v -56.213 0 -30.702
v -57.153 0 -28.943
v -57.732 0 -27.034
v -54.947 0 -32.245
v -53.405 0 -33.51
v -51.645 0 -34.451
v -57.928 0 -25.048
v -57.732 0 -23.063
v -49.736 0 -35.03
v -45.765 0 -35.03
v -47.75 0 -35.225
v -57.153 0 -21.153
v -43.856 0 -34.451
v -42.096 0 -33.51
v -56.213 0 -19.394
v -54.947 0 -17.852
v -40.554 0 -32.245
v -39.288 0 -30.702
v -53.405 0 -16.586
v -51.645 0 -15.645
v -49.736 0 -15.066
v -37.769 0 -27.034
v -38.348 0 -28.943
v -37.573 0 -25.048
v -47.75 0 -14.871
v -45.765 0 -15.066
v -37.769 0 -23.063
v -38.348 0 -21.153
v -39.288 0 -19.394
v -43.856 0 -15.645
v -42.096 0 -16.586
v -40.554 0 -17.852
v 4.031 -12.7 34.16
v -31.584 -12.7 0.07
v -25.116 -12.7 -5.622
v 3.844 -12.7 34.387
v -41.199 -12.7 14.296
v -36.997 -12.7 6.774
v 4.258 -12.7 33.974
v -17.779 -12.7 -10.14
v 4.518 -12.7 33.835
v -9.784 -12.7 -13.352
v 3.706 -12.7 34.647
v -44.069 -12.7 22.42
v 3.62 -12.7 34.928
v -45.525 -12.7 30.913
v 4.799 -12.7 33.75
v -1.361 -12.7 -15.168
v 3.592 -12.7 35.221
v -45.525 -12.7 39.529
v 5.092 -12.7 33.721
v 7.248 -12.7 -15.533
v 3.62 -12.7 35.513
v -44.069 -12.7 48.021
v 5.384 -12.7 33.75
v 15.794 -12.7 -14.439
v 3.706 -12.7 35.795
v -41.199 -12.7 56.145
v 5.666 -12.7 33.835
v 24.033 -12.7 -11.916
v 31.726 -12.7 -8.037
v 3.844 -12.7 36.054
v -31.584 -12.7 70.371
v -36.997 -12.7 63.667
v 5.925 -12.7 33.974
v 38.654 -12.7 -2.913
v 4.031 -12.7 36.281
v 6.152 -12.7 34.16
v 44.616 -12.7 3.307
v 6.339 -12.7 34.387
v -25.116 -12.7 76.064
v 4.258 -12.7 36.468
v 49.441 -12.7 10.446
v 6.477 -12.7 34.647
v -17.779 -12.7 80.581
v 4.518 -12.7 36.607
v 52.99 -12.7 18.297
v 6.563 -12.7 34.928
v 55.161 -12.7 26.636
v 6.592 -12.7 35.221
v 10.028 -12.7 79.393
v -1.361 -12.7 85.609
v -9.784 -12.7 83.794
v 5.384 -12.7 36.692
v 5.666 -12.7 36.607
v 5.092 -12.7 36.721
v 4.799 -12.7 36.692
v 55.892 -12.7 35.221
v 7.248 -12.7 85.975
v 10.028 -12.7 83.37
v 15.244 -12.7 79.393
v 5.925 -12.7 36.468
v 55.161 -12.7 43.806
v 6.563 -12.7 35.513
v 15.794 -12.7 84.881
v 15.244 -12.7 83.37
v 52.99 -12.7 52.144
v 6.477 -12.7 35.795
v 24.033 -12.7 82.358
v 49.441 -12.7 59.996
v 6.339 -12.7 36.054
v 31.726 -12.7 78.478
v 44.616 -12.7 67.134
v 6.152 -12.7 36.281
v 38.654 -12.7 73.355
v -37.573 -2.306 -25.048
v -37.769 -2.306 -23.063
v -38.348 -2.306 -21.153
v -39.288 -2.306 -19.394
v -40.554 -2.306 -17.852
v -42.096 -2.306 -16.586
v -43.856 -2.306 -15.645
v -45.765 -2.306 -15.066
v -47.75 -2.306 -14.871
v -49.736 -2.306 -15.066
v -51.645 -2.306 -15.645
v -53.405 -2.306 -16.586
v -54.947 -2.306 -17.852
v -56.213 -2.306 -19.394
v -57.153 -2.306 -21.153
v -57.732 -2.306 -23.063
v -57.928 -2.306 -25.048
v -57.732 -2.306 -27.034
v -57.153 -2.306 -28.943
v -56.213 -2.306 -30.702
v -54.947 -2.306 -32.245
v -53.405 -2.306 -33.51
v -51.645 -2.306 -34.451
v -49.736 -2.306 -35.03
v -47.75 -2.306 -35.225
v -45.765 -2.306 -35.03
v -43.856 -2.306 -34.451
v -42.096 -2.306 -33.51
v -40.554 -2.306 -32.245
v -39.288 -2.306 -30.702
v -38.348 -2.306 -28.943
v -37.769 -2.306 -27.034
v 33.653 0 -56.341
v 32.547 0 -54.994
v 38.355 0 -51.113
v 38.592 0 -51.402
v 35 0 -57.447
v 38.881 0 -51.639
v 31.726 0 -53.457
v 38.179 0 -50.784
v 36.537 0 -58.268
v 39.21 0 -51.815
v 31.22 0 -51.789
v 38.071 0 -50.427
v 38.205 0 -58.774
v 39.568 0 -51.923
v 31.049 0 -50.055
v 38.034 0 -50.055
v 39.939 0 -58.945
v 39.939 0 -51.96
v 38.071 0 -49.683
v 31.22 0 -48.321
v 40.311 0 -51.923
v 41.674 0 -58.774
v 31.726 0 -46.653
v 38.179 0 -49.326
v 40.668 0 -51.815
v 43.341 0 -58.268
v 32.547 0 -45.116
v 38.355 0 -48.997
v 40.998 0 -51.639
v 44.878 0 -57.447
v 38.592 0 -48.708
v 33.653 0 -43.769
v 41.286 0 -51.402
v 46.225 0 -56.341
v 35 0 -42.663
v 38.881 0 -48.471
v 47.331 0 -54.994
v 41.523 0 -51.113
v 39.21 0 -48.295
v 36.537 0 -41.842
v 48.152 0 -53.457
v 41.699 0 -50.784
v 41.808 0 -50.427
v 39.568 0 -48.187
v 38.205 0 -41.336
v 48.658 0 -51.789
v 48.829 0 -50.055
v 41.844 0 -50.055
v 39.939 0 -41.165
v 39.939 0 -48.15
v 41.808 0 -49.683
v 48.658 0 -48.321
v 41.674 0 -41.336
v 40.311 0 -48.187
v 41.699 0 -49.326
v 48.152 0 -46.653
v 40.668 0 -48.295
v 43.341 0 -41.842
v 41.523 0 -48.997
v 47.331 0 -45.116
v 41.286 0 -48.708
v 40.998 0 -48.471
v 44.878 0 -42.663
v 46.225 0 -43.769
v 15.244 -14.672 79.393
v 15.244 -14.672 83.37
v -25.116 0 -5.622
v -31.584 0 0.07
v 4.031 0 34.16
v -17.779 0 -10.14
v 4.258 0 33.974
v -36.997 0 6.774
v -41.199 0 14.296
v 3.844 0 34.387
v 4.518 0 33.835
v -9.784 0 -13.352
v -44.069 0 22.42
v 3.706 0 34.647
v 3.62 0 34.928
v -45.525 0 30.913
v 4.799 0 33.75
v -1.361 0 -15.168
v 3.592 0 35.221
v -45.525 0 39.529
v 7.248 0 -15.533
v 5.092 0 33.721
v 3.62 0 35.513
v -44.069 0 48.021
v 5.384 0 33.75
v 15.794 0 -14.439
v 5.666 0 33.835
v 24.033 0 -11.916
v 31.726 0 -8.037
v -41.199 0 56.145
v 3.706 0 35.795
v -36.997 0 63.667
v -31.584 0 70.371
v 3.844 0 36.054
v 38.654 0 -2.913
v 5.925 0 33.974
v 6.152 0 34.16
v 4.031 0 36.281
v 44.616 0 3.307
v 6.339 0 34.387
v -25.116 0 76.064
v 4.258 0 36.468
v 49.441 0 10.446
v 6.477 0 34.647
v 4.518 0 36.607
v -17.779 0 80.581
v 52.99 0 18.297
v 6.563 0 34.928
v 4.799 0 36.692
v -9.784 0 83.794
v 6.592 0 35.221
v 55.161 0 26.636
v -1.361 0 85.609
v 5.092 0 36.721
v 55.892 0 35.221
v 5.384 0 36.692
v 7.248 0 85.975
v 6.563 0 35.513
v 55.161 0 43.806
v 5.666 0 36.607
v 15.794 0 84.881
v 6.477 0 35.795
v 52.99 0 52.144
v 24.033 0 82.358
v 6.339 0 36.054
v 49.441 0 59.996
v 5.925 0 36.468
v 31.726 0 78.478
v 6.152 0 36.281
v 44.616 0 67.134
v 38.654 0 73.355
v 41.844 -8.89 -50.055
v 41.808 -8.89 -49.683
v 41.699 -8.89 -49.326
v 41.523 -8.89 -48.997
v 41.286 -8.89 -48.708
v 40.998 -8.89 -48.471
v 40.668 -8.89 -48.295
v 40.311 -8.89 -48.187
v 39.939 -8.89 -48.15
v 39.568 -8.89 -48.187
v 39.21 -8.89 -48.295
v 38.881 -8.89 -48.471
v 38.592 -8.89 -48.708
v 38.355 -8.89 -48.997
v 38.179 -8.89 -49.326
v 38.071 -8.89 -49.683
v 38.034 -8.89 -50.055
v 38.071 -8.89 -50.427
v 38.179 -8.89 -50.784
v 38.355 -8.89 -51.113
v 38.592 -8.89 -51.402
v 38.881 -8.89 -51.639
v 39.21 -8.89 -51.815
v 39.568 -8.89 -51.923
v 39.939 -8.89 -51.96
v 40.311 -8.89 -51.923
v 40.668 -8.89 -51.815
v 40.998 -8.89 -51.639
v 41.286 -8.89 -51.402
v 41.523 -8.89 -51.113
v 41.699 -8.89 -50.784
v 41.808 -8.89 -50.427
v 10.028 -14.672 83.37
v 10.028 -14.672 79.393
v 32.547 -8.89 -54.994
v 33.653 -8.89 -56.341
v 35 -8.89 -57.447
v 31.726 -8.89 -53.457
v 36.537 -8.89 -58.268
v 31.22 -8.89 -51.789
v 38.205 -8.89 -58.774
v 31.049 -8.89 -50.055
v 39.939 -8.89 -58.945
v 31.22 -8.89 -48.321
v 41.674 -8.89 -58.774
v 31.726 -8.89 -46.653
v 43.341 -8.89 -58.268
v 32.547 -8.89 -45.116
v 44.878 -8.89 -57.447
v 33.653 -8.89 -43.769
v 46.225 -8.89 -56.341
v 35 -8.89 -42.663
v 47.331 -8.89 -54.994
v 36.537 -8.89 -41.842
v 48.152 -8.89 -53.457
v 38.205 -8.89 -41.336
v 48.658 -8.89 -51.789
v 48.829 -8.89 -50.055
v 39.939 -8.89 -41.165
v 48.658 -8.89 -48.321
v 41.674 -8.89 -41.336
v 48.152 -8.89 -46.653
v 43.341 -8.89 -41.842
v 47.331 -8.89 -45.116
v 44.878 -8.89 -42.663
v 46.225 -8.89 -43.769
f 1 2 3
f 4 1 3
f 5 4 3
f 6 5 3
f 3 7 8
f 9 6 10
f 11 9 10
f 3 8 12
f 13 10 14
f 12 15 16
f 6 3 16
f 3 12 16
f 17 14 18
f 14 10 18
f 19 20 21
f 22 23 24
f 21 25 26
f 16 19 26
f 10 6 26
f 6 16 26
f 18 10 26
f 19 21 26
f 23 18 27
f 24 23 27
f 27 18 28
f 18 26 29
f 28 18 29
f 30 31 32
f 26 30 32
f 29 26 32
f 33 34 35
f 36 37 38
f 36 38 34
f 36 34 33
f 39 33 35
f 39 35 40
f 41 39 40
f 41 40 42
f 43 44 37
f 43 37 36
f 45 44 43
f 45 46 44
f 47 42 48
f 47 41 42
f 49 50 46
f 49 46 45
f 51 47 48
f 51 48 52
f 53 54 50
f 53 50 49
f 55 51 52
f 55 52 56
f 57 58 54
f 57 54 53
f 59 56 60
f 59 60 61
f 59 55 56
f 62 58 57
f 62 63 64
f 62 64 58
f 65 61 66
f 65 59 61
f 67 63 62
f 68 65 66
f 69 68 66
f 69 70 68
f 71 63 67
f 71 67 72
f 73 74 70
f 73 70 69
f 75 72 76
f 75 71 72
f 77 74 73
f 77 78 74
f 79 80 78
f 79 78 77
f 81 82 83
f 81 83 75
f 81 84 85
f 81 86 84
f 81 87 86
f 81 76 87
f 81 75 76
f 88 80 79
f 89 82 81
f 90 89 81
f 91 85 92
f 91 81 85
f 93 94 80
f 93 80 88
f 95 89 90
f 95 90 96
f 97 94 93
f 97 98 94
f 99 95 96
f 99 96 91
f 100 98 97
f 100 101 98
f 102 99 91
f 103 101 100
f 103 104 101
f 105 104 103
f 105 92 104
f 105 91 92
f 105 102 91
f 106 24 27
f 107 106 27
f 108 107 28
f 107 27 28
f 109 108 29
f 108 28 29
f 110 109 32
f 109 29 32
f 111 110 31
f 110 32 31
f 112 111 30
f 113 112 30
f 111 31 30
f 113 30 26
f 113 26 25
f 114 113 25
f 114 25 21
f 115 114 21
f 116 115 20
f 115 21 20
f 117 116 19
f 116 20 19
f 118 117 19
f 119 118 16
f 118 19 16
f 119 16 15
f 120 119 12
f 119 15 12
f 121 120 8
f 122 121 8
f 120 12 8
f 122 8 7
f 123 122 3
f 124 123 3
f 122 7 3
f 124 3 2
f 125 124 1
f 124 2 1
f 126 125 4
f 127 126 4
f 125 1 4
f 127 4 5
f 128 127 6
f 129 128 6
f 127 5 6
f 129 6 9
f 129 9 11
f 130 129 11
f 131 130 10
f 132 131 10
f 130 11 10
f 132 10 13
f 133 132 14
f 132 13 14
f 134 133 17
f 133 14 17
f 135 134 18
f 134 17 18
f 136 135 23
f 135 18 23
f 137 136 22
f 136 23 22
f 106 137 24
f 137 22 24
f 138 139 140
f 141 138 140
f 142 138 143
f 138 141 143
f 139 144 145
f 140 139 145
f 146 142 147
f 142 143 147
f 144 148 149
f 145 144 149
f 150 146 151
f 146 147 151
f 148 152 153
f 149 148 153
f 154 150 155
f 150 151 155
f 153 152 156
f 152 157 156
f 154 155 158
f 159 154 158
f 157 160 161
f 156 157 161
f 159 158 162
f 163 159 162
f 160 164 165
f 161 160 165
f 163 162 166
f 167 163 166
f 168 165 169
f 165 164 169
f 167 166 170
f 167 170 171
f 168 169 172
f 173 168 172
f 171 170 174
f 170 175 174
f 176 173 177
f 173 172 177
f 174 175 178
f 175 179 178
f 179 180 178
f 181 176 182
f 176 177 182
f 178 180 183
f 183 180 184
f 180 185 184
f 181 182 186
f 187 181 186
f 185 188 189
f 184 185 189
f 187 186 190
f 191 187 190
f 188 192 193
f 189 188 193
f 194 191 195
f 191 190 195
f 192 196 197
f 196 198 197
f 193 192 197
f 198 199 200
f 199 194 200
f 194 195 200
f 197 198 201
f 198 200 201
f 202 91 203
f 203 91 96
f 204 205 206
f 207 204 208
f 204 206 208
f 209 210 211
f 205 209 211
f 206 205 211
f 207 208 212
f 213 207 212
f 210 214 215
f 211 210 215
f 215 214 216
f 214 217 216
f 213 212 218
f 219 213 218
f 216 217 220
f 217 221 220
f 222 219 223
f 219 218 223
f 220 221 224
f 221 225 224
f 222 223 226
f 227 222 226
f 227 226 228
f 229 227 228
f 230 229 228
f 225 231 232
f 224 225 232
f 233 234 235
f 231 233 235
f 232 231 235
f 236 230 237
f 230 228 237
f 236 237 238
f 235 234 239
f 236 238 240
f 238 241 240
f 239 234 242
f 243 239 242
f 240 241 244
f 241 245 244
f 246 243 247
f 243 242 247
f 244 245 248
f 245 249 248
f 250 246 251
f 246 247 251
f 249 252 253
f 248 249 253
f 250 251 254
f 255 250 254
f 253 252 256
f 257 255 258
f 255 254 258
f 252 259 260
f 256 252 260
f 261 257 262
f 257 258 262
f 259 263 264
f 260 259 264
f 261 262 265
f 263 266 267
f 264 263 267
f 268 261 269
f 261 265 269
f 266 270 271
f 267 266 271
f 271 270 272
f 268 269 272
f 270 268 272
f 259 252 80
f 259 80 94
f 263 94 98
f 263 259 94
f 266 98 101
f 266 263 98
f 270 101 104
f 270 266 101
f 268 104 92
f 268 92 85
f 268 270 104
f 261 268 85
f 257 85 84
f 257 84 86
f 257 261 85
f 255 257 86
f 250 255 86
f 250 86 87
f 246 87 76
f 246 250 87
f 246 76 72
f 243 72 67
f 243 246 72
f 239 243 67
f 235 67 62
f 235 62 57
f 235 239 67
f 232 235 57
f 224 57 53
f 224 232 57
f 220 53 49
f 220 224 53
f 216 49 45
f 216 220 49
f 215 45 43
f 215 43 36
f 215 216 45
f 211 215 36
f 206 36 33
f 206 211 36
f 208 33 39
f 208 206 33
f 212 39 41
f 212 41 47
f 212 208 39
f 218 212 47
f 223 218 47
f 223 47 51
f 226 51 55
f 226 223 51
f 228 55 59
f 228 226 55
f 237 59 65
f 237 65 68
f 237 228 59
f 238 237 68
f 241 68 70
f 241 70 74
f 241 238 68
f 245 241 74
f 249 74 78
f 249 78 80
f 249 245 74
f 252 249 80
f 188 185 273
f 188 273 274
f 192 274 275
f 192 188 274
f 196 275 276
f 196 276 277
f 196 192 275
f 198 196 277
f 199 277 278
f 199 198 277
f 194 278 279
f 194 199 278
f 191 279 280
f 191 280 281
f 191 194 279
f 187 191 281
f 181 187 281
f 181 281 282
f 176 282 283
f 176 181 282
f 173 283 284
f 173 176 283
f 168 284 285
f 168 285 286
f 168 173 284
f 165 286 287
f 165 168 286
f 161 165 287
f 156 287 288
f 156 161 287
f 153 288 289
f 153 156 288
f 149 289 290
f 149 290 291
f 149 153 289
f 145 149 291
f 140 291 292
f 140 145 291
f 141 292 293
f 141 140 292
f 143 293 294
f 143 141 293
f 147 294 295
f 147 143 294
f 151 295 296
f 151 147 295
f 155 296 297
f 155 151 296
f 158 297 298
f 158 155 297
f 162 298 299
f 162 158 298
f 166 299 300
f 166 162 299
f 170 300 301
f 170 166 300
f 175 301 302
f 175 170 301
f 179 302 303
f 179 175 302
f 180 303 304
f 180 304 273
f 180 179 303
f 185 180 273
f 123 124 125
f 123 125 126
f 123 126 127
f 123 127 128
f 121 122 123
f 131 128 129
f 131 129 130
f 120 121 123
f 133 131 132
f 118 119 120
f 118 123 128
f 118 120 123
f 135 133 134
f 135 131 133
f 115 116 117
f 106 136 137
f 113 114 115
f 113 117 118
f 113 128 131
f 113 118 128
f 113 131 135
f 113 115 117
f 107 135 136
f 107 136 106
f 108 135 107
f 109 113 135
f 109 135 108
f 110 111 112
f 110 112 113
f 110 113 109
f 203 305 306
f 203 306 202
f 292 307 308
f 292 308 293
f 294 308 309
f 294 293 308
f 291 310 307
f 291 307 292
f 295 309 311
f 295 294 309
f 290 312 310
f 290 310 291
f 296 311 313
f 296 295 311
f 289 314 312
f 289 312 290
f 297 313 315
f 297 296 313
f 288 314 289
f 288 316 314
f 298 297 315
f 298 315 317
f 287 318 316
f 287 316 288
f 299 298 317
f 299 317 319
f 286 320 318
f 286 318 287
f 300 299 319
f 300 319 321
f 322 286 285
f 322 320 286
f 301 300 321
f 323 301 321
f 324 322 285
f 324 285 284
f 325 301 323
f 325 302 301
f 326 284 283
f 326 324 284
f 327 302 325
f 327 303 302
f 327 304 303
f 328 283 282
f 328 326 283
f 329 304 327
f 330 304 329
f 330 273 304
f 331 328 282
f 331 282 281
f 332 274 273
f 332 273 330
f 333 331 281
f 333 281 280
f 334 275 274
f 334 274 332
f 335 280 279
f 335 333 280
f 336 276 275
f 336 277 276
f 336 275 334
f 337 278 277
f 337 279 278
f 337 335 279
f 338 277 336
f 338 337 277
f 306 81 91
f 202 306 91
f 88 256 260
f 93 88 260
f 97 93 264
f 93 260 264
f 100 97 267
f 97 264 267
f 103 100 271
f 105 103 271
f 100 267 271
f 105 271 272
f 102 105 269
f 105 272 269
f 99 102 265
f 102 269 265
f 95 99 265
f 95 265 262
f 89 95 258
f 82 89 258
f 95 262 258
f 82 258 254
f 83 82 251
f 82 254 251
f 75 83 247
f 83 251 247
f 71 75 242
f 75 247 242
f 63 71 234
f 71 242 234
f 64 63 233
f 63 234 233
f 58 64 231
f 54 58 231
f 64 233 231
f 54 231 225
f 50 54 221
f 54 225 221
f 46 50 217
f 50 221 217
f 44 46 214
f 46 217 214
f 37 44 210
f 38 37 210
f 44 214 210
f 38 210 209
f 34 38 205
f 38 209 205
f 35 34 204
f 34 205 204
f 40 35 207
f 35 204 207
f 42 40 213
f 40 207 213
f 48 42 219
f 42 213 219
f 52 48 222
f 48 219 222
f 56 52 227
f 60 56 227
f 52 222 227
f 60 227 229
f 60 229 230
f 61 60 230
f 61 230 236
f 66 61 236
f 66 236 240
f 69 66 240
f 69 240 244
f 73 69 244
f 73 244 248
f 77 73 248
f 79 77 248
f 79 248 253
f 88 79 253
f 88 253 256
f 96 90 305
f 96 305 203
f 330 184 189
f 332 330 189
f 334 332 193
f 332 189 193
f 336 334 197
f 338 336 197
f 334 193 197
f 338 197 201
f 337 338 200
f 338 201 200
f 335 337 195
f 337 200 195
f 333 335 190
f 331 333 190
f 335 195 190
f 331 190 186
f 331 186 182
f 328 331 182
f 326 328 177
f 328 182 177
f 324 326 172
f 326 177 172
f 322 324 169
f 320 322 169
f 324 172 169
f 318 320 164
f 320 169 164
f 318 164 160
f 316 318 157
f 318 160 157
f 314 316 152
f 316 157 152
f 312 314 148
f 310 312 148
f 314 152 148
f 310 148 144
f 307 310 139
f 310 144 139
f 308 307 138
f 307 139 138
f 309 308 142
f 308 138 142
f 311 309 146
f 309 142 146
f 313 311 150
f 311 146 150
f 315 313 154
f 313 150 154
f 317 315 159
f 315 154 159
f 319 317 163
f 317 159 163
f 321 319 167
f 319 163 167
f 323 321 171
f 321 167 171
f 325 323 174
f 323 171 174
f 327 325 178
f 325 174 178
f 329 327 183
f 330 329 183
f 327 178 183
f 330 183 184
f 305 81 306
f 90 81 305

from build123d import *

# Parameters (mm, degrees)
F0_R     = 50.8
F0_R_2   = 1.5
F0_W     = 5.215391
F0_H     = 3.977142
F1_DEPTH = 12.7
F2_DEPTH = 14.67246
F0_R_3   = 10.17734
F3_DEPTH = 2.30627
F0_R_4   = 8.89
F0_R_5   = 1.905
F4_DEPTH = 8.89


with BuildPart() as f1:
    # F0 (on Front) → F1 (new body)
    with BuildSketch(Plane.XZ):
        with Locations((5.091641, 35.220779)):
            Circle(F0_R)
        with Locations((5.091641, 35.220779)):
            Circle(F0_R_2, mode=Mode.SUBTRACT)
        with Locations((12.635866, 81.381563)):
            Rectangle(F0_W, F0_H, mode=Mode.SUBTRACT)
        with Locations((12.635866, 81.381563)):
            Rectangle(F0_W, F0_H)
    extrude(amount=F1_DEPTH)

    # F0 (on Front) → F2 (join)
    with BuildSketch(Plane.XZ):
        with Locations((12.635866, 81.381563)):
            Rectangle(F0_W, F0_H)
    extrude(amount=F2_DEPTH)


with BuildPart() as f3:
    # F0 (on Front) → F3 (new body)
    with BuildSketch(Plane.XZ):
        with Locations((-47.750473, -25.048126)):
            Circle(F0_R_3)
    extrude(amount=F3_DEPTH)


with BuildPart() as f4:
    # F0 (on Front) → F4 (new body)
    with BuildSketch(Plane.XZ):
        with Locations((39.939184, -50.055023)):
            Circle(F0_R_4)
        with Locations((39.939184, -50.055023)):
            Circle(F0_R_5, mode=Mode.SUBTRACT)
    extrude(amount=F4_DEPTH)


solid = Compound([f1.part, f3.part, f4.part])
